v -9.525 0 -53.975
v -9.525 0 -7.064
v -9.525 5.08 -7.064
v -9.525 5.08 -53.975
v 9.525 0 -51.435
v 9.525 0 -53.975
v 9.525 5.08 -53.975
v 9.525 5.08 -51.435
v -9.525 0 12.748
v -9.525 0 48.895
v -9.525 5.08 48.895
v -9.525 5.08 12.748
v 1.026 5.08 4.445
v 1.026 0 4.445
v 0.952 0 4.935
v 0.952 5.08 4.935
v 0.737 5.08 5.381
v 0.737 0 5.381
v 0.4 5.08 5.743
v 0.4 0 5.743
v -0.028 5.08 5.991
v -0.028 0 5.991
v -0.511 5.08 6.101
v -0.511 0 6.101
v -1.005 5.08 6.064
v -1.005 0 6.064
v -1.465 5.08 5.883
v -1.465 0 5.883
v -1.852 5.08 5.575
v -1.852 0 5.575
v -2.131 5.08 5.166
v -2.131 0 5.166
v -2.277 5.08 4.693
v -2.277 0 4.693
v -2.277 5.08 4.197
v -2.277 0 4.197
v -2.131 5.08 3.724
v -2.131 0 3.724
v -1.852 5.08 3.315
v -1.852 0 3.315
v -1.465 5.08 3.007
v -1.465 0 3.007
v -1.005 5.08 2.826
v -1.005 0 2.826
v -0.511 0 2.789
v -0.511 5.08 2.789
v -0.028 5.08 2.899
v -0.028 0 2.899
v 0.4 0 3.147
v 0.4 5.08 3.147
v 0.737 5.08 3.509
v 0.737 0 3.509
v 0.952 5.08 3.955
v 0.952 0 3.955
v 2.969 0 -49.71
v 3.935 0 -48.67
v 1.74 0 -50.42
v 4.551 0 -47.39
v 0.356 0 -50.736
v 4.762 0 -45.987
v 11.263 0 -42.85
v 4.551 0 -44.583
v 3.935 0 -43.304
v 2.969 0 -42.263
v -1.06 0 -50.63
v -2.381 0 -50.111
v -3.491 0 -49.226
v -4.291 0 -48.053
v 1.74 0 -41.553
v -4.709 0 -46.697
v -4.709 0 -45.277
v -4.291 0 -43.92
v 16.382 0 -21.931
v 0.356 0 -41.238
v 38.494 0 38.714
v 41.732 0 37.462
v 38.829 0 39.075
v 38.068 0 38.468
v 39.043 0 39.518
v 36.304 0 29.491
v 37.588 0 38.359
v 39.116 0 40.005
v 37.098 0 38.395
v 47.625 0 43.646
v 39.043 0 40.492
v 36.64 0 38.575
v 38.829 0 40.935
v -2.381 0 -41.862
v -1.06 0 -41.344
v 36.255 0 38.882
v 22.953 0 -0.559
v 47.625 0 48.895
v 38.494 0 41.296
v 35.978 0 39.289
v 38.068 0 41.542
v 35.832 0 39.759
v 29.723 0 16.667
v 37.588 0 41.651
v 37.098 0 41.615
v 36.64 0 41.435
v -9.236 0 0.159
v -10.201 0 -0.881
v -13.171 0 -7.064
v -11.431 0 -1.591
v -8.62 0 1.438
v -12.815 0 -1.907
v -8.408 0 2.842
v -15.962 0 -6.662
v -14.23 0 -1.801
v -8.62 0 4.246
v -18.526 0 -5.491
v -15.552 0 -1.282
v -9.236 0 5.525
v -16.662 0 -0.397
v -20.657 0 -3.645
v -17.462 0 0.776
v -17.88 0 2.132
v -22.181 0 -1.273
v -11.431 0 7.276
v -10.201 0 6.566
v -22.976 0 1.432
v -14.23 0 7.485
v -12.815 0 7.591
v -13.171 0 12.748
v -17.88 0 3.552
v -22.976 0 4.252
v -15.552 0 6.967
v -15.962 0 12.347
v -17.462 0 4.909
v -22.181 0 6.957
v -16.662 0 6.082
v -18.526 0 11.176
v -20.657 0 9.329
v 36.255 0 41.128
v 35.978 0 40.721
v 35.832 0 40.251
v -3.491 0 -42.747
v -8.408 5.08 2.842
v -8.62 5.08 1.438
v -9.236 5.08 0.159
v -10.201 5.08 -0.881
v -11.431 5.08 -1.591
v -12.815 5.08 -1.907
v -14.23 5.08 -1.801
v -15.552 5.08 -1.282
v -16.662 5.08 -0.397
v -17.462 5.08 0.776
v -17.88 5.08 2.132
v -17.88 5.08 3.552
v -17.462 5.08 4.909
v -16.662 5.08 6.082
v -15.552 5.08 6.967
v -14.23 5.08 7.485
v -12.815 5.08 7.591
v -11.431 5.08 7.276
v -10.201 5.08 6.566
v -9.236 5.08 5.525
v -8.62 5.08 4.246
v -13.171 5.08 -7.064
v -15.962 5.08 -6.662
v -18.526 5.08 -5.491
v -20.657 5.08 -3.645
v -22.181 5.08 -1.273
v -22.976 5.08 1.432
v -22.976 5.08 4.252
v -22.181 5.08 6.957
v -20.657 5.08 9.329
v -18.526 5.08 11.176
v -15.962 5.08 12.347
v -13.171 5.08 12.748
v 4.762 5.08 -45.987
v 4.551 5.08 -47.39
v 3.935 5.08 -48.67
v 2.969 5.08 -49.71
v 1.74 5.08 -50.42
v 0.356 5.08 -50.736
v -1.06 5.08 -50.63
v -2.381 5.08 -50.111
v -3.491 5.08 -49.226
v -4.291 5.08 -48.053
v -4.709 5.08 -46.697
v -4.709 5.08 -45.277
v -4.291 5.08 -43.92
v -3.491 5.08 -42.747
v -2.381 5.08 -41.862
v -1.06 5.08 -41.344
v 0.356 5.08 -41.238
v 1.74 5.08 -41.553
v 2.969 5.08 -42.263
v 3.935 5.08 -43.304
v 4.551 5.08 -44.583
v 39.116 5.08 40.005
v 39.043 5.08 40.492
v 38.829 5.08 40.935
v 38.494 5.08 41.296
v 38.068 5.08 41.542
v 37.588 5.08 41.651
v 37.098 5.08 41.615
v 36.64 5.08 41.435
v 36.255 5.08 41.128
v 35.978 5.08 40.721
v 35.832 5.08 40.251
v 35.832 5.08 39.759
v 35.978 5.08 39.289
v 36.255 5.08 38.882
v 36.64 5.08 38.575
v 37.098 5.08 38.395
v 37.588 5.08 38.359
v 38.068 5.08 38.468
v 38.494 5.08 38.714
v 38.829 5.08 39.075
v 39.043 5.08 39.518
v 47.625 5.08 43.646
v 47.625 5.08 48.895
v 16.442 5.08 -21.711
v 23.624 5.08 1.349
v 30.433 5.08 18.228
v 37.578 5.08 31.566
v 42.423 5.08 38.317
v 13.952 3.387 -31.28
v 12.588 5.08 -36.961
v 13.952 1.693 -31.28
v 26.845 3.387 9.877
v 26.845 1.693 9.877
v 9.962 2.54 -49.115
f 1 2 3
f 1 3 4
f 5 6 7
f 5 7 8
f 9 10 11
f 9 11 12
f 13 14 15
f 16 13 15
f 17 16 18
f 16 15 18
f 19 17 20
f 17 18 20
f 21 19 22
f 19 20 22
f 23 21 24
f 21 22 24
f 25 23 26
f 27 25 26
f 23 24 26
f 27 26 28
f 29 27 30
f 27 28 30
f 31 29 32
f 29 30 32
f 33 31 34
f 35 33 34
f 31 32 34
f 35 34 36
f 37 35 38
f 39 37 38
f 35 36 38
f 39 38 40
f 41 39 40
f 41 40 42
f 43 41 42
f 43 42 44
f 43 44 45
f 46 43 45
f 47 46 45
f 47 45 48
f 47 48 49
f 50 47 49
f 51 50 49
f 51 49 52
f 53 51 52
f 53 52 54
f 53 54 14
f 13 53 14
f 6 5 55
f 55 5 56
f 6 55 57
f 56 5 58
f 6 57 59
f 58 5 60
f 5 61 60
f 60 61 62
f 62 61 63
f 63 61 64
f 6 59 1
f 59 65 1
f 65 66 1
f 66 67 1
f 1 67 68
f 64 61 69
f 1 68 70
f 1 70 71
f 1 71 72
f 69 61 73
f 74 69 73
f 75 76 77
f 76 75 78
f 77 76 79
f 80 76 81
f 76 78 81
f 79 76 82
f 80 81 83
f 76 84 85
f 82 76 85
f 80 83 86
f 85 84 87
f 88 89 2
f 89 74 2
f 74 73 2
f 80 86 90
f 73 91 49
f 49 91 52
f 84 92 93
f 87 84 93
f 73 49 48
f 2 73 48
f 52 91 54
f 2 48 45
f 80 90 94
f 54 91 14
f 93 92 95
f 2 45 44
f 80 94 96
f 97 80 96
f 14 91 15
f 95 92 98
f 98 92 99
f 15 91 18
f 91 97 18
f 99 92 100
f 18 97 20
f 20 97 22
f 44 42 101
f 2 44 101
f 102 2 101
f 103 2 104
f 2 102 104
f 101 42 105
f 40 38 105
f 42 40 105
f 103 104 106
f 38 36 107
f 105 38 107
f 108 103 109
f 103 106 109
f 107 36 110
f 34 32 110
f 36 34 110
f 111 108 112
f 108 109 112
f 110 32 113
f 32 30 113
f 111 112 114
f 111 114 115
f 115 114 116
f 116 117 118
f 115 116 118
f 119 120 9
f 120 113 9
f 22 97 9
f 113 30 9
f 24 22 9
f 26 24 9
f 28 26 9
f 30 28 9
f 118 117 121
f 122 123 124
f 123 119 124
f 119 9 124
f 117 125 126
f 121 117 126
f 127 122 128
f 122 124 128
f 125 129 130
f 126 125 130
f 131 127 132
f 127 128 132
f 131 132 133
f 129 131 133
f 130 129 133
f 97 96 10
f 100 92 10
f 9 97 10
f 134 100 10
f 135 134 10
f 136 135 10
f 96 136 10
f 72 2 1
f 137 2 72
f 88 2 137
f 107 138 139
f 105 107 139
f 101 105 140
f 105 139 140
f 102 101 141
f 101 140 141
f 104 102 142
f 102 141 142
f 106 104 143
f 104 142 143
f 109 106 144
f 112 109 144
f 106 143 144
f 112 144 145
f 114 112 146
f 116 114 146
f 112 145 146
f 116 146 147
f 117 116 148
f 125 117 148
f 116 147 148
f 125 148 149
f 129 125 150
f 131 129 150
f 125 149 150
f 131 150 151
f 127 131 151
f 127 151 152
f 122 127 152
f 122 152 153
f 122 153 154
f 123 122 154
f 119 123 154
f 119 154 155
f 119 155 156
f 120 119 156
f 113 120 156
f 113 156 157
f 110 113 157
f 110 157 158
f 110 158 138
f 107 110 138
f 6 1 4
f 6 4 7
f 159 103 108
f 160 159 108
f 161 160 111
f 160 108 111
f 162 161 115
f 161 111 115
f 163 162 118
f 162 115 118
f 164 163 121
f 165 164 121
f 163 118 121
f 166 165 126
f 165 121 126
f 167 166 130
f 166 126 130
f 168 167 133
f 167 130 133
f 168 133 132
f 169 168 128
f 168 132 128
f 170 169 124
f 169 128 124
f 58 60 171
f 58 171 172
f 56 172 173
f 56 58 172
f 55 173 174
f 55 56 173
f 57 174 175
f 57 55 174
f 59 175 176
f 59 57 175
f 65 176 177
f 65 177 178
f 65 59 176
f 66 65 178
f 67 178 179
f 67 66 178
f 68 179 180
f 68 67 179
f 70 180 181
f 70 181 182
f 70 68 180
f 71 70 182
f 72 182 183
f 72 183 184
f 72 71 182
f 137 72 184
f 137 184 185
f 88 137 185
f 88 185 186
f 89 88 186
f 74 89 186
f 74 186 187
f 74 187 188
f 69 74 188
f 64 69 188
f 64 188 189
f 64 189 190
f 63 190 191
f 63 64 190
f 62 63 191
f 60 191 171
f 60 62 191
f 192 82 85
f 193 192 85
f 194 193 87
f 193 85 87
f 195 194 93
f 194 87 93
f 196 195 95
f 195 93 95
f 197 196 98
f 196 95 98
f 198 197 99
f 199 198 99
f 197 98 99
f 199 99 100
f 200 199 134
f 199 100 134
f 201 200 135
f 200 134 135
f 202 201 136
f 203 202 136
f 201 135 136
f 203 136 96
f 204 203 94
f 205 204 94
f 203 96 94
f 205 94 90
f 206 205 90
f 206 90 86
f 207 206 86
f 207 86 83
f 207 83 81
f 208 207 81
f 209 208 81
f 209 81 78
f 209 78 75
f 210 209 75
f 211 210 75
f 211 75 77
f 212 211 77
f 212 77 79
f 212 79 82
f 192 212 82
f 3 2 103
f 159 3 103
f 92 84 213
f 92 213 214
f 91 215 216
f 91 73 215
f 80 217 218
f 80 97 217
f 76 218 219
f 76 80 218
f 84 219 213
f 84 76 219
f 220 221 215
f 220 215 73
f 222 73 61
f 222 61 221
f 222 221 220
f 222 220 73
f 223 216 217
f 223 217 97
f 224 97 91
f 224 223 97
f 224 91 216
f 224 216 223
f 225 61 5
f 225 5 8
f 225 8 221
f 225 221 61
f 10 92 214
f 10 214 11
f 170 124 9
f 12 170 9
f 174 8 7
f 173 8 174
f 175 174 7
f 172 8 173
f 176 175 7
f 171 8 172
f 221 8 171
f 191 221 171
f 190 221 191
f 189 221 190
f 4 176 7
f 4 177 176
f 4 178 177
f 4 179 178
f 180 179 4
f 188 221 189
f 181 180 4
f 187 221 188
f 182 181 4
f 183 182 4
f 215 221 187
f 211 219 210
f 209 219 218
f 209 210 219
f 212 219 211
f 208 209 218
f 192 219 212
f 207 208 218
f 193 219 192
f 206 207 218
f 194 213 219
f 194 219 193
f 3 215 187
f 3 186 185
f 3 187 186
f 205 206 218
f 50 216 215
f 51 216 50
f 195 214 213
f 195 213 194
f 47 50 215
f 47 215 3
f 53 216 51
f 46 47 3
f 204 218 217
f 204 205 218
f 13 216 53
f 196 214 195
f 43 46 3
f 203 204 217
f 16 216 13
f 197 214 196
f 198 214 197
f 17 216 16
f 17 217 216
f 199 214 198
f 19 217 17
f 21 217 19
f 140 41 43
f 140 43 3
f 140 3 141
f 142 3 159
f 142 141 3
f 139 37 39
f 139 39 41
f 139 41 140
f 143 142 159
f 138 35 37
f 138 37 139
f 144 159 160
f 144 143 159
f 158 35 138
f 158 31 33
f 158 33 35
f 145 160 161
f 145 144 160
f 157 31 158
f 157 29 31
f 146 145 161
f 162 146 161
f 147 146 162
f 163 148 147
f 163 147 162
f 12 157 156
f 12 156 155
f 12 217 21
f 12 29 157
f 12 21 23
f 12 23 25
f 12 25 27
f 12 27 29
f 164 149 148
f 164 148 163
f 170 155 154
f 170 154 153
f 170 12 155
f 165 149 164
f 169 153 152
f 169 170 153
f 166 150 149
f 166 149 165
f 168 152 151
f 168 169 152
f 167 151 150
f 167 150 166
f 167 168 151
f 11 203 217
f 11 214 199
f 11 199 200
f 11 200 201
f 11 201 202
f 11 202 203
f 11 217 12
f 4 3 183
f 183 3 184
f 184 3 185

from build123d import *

# Parameters (mm, degrees)
SKETCH1_R               = 4.7625
BOSS_EXTRUDE1_DEPTH     = 5.08
SKETCH4_W               = 19.05
SKETCH4_H               = 5.08
BOSS_EXTRUDE2_DEPTH     = 5.08
SKETCH5_R               = 1.660728382
SKETCH5_R_2             = 1.651
CUT_EXTRUDE1_DEPTH      = 1.0000001
CUT_EXTRUDE1_DEPTH_BACK = 6.0800001
SKETCH6_R               = 4.7625
BOSS_EXTRUDE3_DEPTH     = 5.08
SKETCH8_R               = 4.7625
CUT_EXTRUDE2_DEPTH      = 6.0800001
SKETCH9_W               = 19.05
SKETCH9_H               = 5.08
CUT_EXTRUDE3_DEPTH      = 1.0000001
CUT_EXTRUDE3_DEPTH_BACK = 6.0800001
CUT_EXTRUDE4_DEPTH      = 1.0000001
CUT_EXTRUDE4_DEPTH_BACK = 6.0800001


with BuildPart() as part:
    # Sketch1 → Boss-Extrude1 (new body)
    with BuildSketch(Plane(origin=(0, 0, 0), x_dir=(1, 0, 0), z_dir=(0, 1, 0))):
        with BuildLine():
            Line((-9.525, 53.975), (9.525, 53.975))
            Line((9.525, 53.975), (9.525, 51.435))
            add(Edge.make_bspline(
                [(9.525, 51.435), (9.525, 51.21454564), (27.819109584, -48.895), (60.325, -48.895)],
                knots=[0, 0, 0, 0, 1, 1, 1, 1], degree=3))
            Line((60.325, -48.895), (-9.525, -48.895))
            Line((-9.525, -48.895), (-9.525, 53.975))
        make_face()
        with Locations((0, 45.9867)):
            Circle(SKETCH1_R, mode=Mode.SUBTRACT)
    extrude(amount=BOSS_EXTRUDE1_DEPTH)

    # Sketch4 → Boss-Extrude2 (add)
    with BuildSketch(Plane(origin=(0, 5.08, 0), x_dir=(1, 0, 0), z_dir=(0, 1, 0))):
        with Locations((50.8, -51.435)):
            Rectangle(SKETCH4_W, SKETCH4_H)
    extrude(amount=-BOSS_EXTRUDE2_DEPTH)

    # Sketch5 → Cut-Extrude1 (cut, two sides)
    with BuildSketch(Plane.XZ) as cut_extrude1_sk:
        with Locations((-0.635, 4.445)):
            Circle(SKETCH5_R)
        with Locations((37.465, 40.005)):
            Circle(SKETCH5_R_2)
    extrude(amount=CUT_EXTRUDE1_DEPTH, mode=Mode.SUBTRACT)
    extrude(cut_extrude1_sk.sketch, amount=-CUT_EXTRUDE1_DEPTH_BACK, mode=Mode.SUBTRACT)

    # Sketch6 → Boss-Extrude3 (add)
    with BuildSketch(Plane.XZ):
        with BuildLine():
            Line((-13.170662, 12.74826), (-9.525, 12.74826))
            Line((-9.525, 12.74826), (-9.525, 12.053013747))
            ThreePointArc((-9.525, 12.053013747), (-3.264662, 2.84226), (-9.525, -6.368493747))
            Line((-9.525, -6.368493747), (-9.525, -7.06374))
            Line((-9.525, -7.06374), (-13.170662, -7.06374))
            ThreePointArc((-13.170662, -7.06374), (-23.076662, 2.84226), (-13.170662, 12.74826))
        make_face()
        with Locations((-13.170662, 2.84226)):
            Circle(SKETCH6_R, mode=Mode.SUBTRACT)
    extrude(amount=-BOSS_EXTRUDE3_DEPTH)

    # Sketch8 → Cut-Extrude2 (cut, through all)
    with BuildSketch(Plane(origin=(0, 5.08, 0), x_dir=(1, 0, 0), z_dir=(0, 1, 0))):
        with Locations((-13.170662, -2.84226)):
            Circle(SKETCH8_R)
    extrude(amount=-CUT_EXTRUDE2_DEPTH, mode=Mode.SUBTRACT)

    # Sketch9 → Cut-Extrude3 (cut, two sides)
    with BuildSketch(Plane.XZ) as cut_extrude3_sk:
        with Locations((50.8, 51.435)):
            Rectangle(SKETCH9_W, SKETCH9_H)
    extrude(amount=CUT_EXTRUDE3_DEPTH, mode=Mode.SUBTRACT)
    extrude(cut_extrude3_sk.sketch, amount=-CUT_EXTRUDE3_DEPTH_BACK, mode=Mode.SUBTRACT)

    # Sketch10 → Cut-Extrude4 (cut, two sides)
    with BuildSketch(Plane.XZ) as cut_extrude4_sk:
        with BuildLine():
            Line((47.625, 43.646486826), (47.625, 48.895))
            Line((47.625, 48.895), (60.325, 48.895))
            add(Edge.make_bspline(
                [(60.325, 48.895), (55.814379896, 48.895), (51.577410685, 46.967369191), (47.625, 43.646486826)],
                knots=[0, 0, 0, 0, 0.138763161, 0.138763161, 0.138763161, 0.138763161], degree=3))
        make_face()
    extrude(amount=CUT_EXTRUDE4_DEPTH, mode=Mode.SUBTRACT)
    extrude(cut_extrude4_sk.sketch, amount=-CUT_EXTRUDE4_DEPTH_BACK, mode=Mode.SUBTRACT)


solid = part.part
